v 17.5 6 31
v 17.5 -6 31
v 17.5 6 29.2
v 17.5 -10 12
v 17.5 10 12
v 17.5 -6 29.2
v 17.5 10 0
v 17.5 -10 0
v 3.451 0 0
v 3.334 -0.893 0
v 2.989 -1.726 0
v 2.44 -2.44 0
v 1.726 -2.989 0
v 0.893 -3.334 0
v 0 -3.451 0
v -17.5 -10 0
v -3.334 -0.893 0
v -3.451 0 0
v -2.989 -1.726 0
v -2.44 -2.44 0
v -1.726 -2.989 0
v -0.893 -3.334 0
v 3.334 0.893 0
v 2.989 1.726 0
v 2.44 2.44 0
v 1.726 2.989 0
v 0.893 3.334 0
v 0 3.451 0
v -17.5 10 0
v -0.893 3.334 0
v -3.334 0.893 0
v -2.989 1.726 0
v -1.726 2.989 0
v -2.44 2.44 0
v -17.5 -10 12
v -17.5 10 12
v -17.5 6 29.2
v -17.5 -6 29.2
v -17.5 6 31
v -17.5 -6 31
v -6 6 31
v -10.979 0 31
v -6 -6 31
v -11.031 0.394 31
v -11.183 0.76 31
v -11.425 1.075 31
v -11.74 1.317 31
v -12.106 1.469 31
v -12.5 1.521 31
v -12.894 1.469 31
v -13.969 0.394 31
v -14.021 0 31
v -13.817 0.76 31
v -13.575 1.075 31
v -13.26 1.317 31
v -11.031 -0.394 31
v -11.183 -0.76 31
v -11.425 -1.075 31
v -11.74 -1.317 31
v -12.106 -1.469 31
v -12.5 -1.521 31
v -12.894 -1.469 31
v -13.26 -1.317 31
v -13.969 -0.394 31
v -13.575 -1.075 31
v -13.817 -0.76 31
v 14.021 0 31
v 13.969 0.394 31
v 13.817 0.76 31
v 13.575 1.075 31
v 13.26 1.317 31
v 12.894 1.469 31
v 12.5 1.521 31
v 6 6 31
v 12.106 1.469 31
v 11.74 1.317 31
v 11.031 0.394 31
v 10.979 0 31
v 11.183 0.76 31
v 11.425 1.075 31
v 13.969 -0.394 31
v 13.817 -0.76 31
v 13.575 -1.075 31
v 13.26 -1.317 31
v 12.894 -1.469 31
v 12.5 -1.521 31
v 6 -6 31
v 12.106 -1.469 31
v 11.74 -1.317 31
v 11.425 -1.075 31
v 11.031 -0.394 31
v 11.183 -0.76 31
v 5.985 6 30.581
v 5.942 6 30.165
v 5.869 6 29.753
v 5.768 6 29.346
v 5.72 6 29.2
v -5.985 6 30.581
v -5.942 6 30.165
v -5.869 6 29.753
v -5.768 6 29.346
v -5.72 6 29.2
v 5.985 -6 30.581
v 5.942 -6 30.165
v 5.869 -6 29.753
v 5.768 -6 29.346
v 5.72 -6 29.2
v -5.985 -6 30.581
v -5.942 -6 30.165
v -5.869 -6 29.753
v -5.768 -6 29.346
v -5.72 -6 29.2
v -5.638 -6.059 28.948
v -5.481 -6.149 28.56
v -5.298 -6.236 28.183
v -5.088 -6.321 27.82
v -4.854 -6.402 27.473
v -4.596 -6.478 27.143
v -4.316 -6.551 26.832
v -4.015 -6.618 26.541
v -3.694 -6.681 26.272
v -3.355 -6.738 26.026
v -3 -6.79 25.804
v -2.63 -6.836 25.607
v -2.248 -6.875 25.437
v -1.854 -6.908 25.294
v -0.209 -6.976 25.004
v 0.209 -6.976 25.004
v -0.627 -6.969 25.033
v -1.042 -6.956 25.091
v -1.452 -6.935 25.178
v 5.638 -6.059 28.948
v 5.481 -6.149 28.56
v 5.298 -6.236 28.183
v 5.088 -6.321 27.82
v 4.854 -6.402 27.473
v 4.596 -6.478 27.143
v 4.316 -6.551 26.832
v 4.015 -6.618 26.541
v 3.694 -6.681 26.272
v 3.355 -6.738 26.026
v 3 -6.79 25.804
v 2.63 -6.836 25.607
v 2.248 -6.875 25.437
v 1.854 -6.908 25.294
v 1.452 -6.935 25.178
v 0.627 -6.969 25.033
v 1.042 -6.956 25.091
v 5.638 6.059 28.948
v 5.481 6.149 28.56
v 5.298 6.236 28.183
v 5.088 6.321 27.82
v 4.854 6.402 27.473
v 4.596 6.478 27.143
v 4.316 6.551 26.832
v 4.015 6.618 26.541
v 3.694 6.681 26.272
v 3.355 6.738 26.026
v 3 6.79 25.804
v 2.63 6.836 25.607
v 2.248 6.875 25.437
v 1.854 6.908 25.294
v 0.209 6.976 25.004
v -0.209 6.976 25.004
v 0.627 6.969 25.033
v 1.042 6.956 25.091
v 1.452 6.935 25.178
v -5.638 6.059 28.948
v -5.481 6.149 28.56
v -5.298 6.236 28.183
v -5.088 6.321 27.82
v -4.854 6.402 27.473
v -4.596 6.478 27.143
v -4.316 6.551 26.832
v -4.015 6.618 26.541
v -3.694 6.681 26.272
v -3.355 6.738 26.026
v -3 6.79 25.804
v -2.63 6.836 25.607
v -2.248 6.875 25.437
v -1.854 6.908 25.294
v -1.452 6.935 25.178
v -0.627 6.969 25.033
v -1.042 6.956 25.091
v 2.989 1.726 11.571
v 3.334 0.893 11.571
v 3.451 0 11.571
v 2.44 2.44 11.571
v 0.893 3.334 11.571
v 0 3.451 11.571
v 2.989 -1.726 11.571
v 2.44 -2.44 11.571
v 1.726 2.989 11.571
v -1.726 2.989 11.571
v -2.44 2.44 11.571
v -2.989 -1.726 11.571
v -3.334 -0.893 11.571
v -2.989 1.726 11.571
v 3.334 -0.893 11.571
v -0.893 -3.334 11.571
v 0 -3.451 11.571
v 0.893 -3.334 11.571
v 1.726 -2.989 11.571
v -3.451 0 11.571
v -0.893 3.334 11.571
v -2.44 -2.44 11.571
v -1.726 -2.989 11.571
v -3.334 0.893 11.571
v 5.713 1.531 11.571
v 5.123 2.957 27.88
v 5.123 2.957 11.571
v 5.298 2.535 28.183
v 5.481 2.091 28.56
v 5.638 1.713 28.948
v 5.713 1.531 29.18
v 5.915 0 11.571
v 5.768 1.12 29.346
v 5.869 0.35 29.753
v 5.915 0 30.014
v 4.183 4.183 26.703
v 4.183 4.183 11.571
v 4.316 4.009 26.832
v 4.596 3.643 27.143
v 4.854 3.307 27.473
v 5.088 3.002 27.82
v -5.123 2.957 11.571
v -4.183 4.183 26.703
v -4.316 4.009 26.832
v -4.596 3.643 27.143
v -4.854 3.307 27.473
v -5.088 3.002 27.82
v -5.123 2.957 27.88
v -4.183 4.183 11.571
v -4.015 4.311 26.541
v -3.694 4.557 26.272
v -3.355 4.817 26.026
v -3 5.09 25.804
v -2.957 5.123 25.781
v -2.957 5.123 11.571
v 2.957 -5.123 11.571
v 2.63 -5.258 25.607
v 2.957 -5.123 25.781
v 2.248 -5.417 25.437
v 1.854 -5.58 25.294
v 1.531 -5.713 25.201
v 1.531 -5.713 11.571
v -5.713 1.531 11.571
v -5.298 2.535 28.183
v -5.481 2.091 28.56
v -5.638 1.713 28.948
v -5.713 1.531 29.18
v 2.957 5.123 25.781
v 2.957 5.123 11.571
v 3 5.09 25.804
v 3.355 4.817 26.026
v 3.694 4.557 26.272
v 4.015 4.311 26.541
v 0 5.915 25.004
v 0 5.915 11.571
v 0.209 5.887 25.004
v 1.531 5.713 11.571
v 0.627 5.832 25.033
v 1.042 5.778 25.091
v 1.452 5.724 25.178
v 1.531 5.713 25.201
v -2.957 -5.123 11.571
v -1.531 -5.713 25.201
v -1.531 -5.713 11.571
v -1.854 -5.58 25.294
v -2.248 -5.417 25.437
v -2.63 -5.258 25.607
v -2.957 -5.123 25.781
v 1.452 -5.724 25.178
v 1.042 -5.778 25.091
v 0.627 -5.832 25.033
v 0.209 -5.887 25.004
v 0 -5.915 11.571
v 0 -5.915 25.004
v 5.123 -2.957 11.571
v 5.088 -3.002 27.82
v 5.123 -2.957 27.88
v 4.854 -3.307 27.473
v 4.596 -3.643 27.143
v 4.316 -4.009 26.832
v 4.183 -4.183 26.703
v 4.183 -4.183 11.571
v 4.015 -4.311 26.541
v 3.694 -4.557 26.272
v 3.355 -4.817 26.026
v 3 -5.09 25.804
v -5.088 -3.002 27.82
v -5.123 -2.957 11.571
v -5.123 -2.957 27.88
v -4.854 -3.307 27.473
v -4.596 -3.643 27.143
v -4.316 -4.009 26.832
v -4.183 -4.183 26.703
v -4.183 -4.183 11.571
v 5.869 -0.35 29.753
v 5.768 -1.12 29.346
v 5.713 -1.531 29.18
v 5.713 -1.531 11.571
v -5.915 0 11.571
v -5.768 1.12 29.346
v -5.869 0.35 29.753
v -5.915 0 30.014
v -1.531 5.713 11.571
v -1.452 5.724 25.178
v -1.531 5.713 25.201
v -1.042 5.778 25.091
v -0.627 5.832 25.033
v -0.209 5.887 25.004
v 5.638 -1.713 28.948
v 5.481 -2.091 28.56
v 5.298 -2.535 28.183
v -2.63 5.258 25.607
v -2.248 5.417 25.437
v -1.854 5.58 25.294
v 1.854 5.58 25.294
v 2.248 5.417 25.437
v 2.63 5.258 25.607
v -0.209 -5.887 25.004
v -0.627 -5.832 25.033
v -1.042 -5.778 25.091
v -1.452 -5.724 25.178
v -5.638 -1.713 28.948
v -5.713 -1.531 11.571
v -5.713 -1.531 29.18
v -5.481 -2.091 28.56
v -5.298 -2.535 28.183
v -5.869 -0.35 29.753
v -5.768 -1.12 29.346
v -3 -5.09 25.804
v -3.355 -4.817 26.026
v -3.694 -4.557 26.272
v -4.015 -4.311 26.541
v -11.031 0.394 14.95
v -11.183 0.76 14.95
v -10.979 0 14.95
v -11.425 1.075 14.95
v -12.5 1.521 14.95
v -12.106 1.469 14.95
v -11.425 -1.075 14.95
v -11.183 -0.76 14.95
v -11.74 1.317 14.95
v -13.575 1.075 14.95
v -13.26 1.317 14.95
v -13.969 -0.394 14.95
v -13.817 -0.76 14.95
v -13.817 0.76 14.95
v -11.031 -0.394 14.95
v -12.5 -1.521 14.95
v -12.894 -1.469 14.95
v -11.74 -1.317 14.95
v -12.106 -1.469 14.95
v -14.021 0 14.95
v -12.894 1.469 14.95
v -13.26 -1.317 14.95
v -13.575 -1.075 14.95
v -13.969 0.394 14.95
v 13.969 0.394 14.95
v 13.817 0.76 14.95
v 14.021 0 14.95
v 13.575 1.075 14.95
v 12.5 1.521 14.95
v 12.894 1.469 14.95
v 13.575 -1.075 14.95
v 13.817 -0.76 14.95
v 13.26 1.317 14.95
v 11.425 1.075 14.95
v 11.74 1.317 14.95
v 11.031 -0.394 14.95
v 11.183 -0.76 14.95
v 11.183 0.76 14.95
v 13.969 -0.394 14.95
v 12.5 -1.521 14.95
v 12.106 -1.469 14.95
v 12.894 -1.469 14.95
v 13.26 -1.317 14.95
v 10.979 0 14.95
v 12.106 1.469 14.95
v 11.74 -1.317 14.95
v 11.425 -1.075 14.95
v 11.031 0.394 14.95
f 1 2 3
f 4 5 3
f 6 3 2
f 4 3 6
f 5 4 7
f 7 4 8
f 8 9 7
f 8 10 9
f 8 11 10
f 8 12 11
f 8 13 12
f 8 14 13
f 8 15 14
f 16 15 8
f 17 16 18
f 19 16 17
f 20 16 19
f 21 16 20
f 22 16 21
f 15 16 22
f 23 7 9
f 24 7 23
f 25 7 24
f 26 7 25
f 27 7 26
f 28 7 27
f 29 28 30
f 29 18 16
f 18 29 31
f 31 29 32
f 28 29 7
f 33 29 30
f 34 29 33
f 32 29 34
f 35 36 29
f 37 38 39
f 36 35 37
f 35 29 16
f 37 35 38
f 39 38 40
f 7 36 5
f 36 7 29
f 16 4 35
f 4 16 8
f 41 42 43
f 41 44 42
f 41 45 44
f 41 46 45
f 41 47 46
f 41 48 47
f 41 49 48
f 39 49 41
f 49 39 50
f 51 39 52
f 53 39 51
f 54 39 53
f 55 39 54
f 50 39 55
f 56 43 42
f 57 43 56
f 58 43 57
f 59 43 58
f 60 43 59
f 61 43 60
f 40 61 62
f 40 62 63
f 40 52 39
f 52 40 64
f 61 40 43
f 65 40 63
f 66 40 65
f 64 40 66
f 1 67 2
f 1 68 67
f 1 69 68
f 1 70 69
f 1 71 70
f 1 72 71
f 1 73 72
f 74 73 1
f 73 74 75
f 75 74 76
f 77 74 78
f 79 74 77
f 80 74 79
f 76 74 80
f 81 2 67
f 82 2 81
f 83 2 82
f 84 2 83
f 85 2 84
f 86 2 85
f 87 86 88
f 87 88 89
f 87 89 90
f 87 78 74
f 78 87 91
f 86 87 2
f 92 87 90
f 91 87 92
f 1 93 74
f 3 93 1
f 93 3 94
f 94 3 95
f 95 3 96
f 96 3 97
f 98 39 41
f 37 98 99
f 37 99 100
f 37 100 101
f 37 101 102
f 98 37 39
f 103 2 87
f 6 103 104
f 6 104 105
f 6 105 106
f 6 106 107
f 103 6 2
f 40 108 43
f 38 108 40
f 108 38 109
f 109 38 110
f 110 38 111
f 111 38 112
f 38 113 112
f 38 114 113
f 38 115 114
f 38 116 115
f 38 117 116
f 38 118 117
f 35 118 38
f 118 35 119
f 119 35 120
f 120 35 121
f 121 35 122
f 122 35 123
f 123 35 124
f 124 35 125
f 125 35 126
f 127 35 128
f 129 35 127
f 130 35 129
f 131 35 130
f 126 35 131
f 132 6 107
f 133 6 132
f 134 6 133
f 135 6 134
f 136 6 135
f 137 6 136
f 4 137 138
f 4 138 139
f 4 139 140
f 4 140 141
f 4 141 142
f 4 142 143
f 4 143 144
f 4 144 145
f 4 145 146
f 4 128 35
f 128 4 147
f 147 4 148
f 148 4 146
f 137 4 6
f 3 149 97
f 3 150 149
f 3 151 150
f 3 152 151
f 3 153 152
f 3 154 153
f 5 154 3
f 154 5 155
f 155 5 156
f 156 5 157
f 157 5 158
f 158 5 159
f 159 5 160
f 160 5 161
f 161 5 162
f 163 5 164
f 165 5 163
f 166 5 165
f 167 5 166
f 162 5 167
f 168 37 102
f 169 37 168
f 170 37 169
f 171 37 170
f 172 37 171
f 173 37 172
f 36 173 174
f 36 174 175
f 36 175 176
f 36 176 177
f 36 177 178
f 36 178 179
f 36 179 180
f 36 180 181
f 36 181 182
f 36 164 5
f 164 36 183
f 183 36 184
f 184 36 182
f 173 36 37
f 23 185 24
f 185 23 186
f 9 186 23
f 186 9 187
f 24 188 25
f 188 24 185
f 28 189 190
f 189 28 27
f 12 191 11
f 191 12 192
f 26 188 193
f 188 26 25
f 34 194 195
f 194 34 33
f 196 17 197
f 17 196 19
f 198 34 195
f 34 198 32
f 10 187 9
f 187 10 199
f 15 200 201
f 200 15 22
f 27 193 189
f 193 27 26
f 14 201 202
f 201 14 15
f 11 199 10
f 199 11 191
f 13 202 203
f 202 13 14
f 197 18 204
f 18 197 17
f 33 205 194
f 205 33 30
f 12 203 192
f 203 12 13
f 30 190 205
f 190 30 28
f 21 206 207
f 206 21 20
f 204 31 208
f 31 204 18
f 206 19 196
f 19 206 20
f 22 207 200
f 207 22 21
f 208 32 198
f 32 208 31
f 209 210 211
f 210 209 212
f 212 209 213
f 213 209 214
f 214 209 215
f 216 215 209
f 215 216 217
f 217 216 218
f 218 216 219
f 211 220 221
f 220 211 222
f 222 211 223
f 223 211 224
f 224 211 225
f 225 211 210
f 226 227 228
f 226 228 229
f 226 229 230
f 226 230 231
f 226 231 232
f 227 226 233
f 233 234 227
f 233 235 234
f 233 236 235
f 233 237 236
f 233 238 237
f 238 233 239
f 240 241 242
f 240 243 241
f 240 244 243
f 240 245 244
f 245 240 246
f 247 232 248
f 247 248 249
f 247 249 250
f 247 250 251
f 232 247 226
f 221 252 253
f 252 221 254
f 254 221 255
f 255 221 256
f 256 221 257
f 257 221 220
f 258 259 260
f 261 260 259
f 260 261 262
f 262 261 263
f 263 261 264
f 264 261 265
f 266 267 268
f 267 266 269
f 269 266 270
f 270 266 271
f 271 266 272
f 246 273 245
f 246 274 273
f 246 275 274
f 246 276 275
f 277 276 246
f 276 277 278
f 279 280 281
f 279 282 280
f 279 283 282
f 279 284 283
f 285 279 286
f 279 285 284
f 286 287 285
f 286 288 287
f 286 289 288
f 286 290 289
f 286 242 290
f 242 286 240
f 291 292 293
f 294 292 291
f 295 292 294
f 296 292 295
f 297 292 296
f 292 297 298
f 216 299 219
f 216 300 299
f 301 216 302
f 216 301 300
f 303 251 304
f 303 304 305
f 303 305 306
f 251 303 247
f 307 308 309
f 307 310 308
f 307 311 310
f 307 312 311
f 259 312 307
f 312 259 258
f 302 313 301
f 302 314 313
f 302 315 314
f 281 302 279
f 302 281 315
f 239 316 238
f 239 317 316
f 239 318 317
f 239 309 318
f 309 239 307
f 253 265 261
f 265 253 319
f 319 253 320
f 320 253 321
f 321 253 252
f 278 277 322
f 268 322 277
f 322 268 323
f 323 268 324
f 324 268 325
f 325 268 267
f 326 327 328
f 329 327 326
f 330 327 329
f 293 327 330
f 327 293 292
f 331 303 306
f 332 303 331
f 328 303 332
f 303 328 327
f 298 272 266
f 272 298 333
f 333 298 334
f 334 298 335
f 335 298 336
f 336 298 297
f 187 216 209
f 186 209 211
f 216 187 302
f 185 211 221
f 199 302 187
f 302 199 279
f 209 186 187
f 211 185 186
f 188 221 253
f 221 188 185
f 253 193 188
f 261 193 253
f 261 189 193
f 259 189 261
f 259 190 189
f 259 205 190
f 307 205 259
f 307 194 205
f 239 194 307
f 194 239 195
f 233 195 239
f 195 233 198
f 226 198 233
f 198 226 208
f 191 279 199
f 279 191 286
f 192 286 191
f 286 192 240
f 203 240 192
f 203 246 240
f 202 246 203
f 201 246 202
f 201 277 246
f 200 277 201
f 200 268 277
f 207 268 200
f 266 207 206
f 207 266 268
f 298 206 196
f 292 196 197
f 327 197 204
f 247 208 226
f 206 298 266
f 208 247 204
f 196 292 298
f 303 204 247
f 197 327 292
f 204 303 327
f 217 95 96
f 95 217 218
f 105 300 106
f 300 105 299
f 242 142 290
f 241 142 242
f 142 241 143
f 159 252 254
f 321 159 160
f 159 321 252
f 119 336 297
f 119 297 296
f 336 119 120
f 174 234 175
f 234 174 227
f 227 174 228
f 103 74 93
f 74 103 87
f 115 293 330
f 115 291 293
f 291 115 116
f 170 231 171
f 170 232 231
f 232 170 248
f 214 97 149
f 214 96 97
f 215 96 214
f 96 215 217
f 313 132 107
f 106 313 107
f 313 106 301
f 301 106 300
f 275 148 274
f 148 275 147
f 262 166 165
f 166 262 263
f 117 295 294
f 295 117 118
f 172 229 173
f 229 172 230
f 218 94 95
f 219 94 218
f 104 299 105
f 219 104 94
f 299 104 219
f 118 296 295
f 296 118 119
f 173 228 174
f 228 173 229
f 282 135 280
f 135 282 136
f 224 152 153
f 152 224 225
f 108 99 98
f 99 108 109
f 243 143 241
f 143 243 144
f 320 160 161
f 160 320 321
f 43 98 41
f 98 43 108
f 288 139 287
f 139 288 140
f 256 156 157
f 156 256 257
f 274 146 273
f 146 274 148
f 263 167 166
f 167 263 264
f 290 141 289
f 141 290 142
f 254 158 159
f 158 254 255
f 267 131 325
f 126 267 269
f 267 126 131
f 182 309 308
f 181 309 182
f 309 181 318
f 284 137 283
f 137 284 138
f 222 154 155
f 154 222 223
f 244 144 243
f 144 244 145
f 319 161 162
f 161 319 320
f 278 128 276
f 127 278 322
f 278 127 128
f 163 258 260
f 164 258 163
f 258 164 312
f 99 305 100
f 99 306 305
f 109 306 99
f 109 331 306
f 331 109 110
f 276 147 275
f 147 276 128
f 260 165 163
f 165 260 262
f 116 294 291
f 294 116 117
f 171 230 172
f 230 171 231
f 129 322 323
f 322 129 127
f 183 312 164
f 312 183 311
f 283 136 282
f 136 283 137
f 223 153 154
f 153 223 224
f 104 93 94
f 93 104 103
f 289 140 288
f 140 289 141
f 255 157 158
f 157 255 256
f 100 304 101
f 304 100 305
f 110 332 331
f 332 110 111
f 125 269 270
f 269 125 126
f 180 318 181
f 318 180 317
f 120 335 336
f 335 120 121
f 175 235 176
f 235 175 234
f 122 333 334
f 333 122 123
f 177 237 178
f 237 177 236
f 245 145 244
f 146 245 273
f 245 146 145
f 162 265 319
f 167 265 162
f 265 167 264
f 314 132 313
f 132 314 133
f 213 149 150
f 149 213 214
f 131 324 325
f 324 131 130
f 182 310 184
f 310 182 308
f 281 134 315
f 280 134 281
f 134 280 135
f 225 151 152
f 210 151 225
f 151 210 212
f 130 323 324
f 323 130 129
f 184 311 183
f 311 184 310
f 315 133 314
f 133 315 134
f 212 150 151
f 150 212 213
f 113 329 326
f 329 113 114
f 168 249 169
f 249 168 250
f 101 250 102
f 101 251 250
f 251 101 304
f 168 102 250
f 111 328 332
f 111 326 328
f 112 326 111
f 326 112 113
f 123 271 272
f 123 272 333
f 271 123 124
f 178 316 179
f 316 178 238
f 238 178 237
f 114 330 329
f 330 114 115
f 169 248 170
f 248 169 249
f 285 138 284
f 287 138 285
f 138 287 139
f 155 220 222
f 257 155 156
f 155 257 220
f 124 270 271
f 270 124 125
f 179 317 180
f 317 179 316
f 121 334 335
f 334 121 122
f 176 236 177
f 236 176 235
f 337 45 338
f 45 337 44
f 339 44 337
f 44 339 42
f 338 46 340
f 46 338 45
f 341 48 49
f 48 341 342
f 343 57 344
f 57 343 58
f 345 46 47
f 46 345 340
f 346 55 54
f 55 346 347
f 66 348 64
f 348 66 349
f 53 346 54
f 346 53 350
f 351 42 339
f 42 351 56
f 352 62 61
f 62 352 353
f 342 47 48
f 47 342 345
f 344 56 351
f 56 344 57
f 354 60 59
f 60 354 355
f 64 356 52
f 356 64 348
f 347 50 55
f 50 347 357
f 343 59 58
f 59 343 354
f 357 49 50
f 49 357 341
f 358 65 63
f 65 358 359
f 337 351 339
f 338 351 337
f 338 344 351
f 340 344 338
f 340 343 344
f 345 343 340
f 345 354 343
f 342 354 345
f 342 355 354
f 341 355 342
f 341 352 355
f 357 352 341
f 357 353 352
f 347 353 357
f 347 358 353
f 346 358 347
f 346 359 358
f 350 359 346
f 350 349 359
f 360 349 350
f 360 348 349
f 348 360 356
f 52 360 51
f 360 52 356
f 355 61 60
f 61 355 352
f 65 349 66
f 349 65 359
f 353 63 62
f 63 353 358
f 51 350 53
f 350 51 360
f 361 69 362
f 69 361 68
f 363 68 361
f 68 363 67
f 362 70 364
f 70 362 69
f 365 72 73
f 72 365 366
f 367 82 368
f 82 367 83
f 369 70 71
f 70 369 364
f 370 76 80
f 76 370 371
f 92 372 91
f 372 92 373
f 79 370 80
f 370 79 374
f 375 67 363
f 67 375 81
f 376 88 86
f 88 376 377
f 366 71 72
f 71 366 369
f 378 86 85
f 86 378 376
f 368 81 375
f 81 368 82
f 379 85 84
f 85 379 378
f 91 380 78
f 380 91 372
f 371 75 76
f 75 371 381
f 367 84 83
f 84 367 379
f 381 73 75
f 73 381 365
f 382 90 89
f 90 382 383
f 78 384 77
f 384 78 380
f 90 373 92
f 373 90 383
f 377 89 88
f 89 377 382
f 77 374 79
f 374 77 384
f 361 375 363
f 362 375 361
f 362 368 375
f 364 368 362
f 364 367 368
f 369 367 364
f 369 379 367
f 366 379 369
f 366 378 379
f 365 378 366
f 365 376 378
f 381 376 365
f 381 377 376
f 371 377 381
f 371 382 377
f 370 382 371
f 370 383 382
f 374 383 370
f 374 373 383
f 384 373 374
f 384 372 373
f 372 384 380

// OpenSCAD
// ****************************************
// 12mm Slide Rail to 1" 8020 1010-Black Mounting
// Filename: SlideRailMount.scad
// Created: 2/19/2019
// Revision: 1.0
// Units: mm
// ****************************************

include <CommonStuffSAEmm.scad>

$fn=90;
IDXtra=0.2;
Overlap=0.05;

module SlideRailMount(H=31,W=20,L=35){
	BoltCL=25;
	RailSup_W=12; //13.8;
	
	difference(){
		union(){
			translate([-L/2,-W/2,0]) cube([L,W,12]);
			translate([-L/2,-RailSup_W/2,H-2]) cube([L,RailSup_W,2]);
			hull(){
				translate([-L/2,-W/2,11]) cube([L,W,1]);
				translate([-L/2,-RailSup_W/2,H-2]) cube([L,RailSup_W,0.2]);
			} // hull
		} // union
		
		
		translate([0,10,H]) rotate([90,0,0]) cylinder(d=12,h=20);
		
		translate([-BoltCL/2,0,H]) Bolt6Hole();
		translate([BoltCL/2,0,H]) Bolt6Hole();
		translate([0,0,15]) Bolt250ButtonHeadHole(depth=12,lHead=H);
		//translate([0,0,17.8]) Bolt250HeadHole(depth=11.5,lAccess=H);
	} // diff
	
} // SlideRailMount

SlideRailMount();
